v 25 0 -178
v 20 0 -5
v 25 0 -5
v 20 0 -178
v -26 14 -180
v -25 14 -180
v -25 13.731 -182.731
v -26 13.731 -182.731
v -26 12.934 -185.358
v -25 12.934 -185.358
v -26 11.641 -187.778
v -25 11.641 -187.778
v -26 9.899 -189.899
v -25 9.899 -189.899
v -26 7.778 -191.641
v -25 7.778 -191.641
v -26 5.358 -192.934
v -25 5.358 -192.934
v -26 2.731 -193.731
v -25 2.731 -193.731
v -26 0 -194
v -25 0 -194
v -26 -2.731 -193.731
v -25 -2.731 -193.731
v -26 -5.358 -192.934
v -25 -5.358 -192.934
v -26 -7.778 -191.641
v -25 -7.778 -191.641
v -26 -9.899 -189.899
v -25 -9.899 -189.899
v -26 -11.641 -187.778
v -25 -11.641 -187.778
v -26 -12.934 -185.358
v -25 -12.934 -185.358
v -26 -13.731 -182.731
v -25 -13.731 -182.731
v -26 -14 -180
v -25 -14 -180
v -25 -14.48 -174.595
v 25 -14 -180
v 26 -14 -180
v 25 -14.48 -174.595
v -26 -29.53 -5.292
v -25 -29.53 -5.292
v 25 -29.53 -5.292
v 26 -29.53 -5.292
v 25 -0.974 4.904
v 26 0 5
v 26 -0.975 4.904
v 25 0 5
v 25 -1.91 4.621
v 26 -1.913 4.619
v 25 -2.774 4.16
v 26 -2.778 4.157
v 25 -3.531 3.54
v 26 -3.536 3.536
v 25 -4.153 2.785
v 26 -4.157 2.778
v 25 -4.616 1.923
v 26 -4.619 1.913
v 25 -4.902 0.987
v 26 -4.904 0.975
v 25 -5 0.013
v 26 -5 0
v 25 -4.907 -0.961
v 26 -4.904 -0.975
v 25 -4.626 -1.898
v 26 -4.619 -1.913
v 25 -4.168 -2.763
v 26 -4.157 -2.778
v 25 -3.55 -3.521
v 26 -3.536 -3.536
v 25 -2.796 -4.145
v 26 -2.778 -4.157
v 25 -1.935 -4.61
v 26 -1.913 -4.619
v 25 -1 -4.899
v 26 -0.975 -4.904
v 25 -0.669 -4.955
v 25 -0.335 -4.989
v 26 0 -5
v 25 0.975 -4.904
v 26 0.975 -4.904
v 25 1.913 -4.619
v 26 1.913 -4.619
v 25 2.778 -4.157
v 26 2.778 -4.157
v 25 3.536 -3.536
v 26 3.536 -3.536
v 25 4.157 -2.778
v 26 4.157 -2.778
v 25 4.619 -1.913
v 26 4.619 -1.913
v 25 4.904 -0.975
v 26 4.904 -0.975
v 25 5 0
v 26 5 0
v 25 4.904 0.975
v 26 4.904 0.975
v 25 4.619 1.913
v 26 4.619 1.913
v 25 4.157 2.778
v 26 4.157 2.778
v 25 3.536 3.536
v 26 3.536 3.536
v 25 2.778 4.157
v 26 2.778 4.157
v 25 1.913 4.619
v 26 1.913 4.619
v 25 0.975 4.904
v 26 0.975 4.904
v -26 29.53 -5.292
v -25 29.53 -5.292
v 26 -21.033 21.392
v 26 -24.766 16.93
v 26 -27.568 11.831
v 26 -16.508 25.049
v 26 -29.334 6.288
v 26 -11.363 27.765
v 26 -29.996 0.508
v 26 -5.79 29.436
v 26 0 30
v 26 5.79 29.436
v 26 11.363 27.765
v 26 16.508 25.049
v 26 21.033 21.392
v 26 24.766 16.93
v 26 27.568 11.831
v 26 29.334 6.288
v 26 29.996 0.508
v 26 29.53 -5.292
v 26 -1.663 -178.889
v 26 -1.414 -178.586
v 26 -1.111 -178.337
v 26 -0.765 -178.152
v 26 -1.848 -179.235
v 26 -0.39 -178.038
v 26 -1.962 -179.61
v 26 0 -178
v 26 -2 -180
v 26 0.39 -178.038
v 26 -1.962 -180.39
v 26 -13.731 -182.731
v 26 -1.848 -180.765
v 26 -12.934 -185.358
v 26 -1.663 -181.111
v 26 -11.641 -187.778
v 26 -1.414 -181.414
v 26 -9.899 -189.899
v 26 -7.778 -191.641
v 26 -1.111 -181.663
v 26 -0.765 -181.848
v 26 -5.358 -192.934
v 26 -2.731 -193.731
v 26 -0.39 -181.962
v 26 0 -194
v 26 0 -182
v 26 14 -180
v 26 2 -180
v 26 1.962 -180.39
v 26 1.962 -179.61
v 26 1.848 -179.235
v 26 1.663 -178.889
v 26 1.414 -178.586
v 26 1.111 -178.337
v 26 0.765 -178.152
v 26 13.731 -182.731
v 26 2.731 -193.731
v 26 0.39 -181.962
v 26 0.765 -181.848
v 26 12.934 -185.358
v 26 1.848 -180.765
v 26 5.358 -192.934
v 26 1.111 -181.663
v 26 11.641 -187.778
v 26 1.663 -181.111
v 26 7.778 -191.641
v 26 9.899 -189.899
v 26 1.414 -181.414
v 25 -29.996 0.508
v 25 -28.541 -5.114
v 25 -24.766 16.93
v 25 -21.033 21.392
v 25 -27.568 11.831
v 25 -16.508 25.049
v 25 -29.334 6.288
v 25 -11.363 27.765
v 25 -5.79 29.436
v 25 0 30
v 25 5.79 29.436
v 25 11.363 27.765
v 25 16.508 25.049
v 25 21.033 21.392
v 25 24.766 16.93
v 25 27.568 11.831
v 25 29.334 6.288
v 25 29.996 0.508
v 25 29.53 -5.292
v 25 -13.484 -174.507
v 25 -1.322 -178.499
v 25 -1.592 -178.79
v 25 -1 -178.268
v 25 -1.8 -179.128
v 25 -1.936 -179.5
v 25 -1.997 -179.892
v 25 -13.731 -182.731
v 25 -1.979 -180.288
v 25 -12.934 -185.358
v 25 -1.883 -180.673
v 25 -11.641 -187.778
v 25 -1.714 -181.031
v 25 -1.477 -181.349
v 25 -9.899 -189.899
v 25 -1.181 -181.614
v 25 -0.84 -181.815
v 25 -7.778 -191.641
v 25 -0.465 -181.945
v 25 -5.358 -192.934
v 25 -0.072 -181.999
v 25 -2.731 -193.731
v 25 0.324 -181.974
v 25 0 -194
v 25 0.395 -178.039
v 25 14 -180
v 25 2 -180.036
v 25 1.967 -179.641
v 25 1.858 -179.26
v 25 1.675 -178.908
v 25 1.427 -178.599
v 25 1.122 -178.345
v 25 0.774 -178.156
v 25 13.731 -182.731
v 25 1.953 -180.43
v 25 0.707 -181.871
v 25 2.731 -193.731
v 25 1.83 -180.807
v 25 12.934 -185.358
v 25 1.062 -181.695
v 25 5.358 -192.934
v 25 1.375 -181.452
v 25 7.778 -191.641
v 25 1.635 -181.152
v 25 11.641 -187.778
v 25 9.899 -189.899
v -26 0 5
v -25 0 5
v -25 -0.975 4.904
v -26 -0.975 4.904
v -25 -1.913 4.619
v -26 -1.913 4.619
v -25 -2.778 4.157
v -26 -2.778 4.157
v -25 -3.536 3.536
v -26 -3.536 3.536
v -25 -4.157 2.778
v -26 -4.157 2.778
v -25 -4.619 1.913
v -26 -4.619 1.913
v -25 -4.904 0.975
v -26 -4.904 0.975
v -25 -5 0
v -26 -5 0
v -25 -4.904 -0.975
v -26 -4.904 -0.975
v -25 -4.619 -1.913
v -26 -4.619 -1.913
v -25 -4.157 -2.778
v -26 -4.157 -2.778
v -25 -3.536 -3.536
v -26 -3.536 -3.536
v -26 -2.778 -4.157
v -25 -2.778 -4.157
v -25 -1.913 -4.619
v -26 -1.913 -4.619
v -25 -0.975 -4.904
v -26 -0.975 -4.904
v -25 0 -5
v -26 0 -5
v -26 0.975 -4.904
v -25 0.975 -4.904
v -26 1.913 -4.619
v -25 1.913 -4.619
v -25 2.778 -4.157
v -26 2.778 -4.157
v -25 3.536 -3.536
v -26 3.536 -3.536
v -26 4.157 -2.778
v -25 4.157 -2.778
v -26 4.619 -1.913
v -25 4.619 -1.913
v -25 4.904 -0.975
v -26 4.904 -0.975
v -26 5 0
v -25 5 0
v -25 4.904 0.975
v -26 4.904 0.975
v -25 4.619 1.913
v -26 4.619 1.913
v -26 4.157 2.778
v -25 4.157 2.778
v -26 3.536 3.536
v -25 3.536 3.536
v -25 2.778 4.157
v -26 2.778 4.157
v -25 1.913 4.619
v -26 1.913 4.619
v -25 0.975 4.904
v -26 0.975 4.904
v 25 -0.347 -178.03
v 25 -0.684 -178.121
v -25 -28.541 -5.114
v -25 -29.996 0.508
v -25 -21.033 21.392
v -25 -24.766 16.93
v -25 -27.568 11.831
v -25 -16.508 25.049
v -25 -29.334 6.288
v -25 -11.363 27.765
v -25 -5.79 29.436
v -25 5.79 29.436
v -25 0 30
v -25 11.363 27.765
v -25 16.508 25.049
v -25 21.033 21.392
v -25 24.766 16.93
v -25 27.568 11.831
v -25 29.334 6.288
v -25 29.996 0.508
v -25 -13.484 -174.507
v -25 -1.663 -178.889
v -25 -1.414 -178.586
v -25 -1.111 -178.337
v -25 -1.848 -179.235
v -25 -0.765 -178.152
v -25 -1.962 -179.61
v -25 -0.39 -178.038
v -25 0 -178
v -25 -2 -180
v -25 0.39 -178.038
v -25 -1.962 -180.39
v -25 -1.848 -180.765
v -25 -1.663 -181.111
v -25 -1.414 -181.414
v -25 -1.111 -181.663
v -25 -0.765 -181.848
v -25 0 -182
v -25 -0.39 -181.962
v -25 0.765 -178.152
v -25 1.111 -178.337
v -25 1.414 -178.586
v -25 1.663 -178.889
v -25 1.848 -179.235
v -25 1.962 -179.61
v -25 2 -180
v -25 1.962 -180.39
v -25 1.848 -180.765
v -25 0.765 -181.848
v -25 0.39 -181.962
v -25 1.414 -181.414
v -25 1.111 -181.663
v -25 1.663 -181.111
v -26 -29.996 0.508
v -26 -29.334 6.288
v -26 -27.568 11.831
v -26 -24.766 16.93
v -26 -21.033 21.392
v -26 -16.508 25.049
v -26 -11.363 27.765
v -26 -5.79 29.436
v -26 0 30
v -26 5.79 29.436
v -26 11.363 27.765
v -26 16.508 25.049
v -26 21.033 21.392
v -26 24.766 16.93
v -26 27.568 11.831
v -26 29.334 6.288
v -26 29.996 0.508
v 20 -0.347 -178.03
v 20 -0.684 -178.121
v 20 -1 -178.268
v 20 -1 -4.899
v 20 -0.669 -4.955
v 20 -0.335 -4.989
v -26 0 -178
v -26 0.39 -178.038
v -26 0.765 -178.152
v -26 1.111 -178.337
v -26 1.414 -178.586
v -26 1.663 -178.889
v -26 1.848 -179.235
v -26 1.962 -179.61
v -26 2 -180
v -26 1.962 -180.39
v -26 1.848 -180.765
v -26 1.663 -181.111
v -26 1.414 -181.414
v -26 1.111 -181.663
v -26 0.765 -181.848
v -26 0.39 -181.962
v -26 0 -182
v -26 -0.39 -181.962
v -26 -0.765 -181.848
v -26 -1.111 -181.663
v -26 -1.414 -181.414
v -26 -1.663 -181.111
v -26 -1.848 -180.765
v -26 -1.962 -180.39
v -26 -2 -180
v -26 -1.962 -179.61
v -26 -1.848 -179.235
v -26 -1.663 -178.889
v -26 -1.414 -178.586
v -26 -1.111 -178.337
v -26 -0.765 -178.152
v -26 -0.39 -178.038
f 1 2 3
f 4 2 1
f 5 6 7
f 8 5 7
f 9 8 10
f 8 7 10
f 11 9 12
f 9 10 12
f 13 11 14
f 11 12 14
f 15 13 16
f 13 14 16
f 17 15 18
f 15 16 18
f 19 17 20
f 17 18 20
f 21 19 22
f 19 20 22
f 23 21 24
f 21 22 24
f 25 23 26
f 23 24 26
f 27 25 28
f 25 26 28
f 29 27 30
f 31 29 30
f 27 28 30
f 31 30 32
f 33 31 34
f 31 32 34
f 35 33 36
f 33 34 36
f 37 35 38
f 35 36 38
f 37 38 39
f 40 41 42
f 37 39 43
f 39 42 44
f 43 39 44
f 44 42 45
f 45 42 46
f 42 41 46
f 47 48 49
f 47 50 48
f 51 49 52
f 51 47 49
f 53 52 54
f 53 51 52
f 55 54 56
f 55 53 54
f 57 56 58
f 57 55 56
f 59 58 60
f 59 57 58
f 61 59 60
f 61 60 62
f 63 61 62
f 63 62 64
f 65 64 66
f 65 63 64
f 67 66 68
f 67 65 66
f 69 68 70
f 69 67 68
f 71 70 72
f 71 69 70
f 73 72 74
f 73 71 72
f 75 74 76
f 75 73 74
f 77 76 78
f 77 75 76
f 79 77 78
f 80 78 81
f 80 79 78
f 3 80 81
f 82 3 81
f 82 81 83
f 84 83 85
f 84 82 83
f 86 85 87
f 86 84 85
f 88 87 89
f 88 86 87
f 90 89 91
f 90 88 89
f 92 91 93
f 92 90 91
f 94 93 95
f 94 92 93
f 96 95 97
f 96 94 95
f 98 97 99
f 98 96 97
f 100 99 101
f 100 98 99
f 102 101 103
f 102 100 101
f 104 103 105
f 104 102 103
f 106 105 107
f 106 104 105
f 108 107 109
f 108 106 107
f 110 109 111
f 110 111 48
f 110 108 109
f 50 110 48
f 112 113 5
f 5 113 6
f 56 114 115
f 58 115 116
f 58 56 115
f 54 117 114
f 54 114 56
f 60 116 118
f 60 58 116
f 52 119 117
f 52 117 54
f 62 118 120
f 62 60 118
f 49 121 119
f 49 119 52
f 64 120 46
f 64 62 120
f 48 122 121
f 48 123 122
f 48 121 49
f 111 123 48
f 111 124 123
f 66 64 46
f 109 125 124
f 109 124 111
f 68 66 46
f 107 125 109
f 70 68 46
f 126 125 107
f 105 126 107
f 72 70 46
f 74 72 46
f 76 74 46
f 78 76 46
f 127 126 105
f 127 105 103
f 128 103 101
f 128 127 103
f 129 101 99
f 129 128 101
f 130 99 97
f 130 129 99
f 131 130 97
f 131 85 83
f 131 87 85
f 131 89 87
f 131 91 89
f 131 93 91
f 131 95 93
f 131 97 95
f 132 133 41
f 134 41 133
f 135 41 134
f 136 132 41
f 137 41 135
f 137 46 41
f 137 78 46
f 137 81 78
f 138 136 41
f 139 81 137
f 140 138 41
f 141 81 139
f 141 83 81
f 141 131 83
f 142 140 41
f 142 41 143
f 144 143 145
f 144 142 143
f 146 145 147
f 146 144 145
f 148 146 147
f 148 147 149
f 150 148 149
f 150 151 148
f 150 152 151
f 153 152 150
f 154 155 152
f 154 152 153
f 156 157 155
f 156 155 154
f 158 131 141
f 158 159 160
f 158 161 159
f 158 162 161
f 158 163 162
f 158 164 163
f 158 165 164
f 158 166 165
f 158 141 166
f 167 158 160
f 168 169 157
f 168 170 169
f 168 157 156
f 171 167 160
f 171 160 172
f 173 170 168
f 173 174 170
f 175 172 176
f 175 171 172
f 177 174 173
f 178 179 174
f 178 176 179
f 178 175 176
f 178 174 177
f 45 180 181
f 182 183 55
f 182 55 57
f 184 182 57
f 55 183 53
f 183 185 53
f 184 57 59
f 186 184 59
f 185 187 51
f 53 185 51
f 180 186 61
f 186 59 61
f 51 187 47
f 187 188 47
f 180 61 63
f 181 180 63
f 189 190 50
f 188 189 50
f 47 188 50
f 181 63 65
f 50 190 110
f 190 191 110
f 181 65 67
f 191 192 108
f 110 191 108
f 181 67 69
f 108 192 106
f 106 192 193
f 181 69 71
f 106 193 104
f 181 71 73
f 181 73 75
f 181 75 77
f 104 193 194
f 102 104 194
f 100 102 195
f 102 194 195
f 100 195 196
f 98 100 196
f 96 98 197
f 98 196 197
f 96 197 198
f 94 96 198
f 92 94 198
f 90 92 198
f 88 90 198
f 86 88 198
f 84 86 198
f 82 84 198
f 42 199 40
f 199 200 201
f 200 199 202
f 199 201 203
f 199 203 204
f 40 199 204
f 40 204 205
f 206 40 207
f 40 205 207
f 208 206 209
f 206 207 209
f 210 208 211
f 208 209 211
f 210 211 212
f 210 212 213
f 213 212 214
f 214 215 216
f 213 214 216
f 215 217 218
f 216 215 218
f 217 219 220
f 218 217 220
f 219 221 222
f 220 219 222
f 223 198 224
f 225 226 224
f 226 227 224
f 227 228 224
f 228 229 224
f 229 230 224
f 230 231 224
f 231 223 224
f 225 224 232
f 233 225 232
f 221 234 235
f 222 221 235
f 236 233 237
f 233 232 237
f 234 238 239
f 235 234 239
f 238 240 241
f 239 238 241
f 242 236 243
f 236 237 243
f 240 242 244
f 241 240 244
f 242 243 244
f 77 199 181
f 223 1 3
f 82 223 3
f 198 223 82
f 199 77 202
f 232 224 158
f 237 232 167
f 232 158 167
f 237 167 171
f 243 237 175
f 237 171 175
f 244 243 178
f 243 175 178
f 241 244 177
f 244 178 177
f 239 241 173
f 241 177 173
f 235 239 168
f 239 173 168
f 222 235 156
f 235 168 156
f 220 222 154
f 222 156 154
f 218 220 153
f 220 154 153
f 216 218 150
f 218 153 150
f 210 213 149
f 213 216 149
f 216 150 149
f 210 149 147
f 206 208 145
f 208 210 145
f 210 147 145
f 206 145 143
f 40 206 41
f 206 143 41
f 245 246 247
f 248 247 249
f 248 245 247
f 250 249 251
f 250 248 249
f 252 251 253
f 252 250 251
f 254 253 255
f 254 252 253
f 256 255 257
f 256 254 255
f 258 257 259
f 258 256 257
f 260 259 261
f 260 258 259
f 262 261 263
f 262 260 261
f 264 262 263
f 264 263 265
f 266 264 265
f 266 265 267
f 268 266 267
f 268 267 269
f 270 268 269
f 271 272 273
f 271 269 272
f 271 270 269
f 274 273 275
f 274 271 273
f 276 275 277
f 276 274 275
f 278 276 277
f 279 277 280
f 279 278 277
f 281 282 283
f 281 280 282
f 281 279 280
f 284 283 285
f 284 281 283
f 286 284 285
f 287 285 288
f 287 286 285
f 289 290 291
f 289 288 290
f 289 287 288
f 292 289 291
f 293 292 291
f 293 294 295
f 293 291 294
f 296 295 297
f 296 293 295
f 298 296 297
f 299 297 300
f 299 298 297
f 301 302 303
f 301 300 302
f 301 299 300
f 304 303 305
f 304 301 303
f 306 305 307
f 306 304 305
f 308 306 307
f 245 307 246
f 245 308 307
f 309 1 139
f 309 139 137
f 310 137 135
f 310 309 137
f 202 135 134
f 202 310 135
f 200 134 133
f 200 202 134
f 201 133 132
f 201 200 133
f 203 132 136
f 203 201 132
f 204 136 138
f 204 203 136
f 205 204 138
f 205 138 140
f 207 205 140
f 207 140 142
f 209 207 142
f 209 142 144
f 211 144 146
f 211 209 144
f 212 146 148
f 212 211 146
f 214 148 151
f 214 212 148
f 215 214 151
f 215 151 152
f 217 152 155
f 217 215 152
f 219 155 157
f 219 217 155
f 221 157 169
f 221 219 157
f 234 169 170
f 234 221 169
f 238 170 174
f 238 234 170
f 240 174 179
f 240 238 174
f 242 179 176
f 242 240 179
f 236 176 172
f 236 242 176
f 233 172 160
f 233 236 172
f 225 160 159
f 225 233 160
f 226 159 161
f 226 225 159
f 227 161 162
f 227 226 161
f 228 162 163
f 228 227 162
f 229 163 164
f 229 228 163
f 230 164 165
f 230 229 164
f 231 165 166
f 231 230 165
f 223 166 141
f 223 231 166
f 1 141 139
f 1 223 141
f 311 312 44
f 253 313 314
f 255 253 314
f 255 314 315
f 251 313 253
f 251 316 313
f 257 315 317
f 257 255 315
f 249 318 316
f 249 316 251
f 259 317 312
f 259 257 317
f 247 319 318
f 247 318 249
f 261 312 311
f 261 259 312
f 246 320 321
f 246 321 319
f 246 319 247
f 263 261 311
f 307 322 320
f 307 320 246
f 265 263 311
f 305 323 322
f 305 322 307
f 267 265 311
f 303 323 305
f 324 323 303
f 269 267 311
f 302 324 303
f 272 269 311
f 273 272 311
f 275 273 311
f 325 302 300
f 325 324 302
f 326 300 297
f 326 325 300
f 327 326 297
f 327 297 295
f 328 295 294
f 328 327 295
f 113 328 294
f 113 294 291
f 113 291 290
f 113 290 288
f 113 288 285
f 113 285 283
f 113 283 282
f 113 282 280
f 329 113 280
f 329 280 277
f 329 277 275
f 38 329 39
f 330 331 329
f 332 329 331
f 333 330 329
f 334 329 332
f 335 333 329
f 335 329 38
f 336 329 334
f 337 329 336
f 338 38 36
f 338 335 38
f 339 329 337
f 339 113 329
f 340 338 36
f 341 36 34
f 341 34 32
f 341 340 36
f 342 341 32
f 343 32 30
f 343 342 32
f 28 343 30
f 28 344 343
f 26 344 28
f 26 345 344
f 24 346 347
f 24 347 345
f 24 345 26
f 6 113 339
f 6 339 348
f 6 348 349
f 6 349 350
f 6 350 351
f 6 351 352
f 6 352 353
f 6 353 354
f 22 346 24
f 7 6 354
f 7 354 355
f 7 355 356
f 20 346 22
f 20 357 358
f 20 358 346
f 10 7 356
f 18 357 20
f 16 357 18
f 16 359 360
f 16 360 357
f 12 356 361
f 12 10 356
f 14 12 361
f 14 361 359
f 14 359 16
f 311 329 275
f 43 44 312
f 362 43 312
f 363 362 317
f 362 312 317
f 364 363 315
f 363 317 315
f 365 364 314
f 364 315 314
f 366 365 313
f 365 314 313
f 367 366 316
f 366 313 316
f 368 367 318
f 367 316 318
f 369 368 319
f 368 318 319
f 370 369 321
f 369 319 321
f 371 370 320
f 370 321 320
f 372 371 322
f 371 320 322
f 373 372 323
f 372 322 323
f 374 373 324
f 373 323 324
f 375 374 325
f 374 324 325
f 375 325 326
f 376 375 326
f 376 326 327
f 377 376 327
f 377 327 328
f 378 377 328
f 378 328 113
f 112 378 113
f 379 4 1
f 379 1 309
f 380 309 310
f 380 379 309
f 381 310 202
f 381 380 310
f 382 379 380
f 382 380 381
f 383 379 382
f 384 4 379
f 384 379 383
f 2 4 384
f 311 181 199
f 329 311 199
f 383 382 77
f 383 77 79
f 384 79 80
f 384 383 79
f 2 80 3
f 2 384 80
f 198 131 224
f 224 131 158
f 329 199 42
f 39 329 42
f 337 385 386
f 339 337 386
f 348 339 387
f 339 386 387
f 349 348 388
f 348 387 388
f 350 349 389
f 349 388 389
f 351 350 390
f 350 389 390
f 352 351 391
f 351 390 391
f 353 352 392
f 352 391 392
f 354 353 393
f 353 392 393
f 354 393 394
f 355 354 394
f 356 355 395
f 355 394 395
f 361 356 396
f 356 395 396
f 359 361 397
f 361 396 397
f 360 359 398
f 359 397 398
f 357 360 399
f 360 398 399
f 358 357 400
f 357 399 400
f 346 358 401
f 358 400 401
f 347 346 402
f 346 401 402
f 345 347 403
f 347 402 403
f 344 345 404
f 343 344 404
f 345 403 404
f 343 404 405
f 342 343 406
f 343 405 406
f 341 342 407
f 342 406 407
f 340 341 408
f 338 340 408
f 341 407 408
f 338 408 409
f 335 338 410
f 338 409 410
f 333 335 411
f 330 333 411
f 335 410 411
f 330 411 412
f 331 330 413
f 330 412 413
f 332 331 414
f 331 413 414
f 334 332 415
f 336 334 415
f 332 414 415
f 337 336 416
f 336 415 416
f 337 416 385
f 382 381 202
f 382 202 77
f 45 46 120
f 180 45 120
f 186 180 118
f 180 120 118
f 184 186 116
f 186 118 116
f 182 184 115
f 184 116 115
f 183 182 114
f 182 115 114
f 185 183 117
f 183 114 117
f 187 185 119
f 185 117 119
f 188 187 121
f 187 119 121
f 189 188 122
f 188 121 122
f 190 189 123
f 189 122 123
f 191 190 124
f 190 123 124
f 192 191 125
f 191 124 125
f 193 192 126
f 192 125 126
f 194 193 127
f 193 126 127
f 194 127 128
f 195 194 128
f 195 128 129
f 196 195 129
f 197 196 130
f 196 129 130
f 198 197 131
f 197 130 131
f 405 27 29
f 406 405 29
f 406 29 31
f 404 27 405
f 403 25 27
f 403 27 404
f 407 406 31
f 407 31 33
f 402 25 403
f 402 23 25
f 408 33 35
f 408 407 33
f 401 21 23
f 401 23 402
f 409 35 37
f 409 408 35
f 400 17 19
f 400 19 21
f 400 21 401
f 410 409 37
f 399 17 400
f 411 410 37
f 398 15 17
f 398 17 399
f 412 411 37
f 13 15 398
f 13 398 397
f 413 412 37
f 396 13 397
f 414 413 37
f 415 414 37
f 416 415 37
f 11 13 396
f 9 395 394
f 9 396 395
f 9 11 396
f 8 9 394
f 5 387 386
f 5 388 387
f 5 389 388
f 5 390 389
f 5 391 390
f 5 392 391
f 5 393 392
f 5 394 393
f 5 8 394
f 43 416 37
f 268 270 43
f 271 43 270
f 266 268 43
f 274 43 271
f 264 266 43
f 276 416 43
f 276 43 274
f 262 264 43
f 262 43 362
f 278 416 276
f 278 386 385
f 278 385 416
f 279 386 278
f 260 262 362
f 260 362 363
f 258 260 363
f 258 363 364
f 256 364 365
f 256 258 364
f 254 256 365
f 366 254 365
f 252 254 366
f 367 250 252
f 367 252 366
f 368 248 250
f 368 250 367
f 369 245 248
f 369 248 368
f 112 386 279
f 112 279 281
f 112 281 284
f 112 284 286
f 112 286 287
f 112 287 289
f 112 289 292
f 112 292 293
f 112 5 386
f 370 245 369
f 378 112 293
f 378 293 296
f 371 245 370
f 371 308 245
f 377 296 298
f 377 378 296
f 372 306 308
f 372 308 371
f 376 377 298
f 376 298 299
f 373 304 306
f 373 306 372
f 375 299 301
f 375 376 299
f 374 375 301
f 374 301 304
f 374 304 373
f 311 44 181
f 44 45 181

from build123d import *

# Parameters (mm, degrees)
SKETCH1_R           = 5
SKETCH1_R_2         = 2.5
BOSS_EXTRUDE1_DEPTH = 26
CUT_EXTRUDE1_DEPTH  = 25
SKETCH5_R           = 2.67469655
SKETCH5_R_2         = 2
BOSS_EXTRUDE2_DEPTH = 1
BOSS_EXTRUDE3_START = -1
SKETCH6_R           = 2.5
SKETCH6_R_2         = 2
BOSS_EXTRUDE3_DEPTH = 1
BOSS_EXTRUDE4_START = 5
BOSS_EXTRUDE4_DEPTH = 5


with BuildPart() as part:
    # Sketch1 → Boss-Extrude1 (new, symmetric)
    with BuildSketch(Plane(origin=(0, 0, 0), x_dir=(0, 0, -1), z_dir=(1, 0, 0))):
        with BuildLine():
            Line((5.291523763, 29.529642332), (180, 14))
            ThreePointArc((180, 14), (194, 0), (180, -14))
            Line((180, -14), (5.291523763, -29.529642332))
            ThreePointArc((5.291523763, -29.529642332), (-30, 0), (5.291523763, 29.529642332))
        make_face()
        with Locations(Location((0, 0, 0), (0, 0, 180))):
            Circle(SKETCH1_R, mode=Mode.SUBTRACT)
        with Locations(Location((180, 0, 0), (0, 0, 180))):
            Circle(SKETCH1_R_2, mode=Mode.SUBTRACT)
    extrude(amount=BOSS_EXTRUDE1_DEPTH, both=True)

    # Sketch2 → Cut-Extrude1 (cut, symmetric)
    with BuildSketch(Plane(origin=(0, 0, 0), x_dir=(0, 0, -1), z_dir=(1, 0, 0))):
        with BuildLine():
            Line((5.291523763, -29.529642332), (5.114444182, -28.541439895))
            Line((5.114444182, -28.541439895), (174.506520913, -13.484366408))
            Line((174.506520913, -13.484366408), (174.595060704, -14.480439049))
            Line((174.595060704, -14.480439049), (180, -14))
            ThreePointArc((180, -14), (194, 0), (180, 14))
            Line((180, 14), (5.291523763, 29.529642332))
            ThreePointArc((5.291523763, 29.529642332), (-30, 0), (5.291523763, -29.529642332))
        make_face()
    extrude(amount=CUT_EXTRUDE1_DEPTH, both=True, mode=Mode.SUBTRACT)

    # Sketch5 → Boss-Extrude2 (add)
    with BuildSketch(Plane.ZY.offset(26)):
        with Locations((-180, 0)):
            Circle(SKETCH5_R)
        with Locations((-180, 0)):
            Circle(SKETCH5_R_2, mode=Mode.SUBTRACT)
    extrude(amount=-BOSS_EXTRUDE2_DEPTH)

    # Sketch6 → Boss-Extrude3 (add)
    with BuildSketch(Plane(origin=(26, 0, 0), x_dir=(0, 0, -1), z_dir=(1, 0, 0)).offset(BOSS_EXTRUDE3_START)):
        with Locations((180, 0)):
            Circle(SKETCH6_R)
        with Locations(Location((180, 0, 0), (0, 0, 180))):
            Circle(SKETCH6_R_2, mode=Mode.SUBTRACT)
    extrude(amount=BOSS_EXTRUDE3_DEPTH)

    # Sketch7 → Boss-Extrude4 (add)
    with BuildSketch(Plane.ZY.offset(-25).offset(BOSS_EXTRUDE4_START)):
        with BuildLine():
            Line((-5, 0), (-178, 0))
            ThreePointArc((-178, 0), (-178.068148347, -0.51763809), (-178.267949192, -1))
            Line((-178.267949192, -1), (-4.898979486, -1))
            ThreePointArc((-4.898979486, -1), (-4.974680765, -0.50254481), (-5, 0))
        make_face()
    extrude(amount=-BOSS_EXTRUDE4_DEPTH)


solid = part.part
